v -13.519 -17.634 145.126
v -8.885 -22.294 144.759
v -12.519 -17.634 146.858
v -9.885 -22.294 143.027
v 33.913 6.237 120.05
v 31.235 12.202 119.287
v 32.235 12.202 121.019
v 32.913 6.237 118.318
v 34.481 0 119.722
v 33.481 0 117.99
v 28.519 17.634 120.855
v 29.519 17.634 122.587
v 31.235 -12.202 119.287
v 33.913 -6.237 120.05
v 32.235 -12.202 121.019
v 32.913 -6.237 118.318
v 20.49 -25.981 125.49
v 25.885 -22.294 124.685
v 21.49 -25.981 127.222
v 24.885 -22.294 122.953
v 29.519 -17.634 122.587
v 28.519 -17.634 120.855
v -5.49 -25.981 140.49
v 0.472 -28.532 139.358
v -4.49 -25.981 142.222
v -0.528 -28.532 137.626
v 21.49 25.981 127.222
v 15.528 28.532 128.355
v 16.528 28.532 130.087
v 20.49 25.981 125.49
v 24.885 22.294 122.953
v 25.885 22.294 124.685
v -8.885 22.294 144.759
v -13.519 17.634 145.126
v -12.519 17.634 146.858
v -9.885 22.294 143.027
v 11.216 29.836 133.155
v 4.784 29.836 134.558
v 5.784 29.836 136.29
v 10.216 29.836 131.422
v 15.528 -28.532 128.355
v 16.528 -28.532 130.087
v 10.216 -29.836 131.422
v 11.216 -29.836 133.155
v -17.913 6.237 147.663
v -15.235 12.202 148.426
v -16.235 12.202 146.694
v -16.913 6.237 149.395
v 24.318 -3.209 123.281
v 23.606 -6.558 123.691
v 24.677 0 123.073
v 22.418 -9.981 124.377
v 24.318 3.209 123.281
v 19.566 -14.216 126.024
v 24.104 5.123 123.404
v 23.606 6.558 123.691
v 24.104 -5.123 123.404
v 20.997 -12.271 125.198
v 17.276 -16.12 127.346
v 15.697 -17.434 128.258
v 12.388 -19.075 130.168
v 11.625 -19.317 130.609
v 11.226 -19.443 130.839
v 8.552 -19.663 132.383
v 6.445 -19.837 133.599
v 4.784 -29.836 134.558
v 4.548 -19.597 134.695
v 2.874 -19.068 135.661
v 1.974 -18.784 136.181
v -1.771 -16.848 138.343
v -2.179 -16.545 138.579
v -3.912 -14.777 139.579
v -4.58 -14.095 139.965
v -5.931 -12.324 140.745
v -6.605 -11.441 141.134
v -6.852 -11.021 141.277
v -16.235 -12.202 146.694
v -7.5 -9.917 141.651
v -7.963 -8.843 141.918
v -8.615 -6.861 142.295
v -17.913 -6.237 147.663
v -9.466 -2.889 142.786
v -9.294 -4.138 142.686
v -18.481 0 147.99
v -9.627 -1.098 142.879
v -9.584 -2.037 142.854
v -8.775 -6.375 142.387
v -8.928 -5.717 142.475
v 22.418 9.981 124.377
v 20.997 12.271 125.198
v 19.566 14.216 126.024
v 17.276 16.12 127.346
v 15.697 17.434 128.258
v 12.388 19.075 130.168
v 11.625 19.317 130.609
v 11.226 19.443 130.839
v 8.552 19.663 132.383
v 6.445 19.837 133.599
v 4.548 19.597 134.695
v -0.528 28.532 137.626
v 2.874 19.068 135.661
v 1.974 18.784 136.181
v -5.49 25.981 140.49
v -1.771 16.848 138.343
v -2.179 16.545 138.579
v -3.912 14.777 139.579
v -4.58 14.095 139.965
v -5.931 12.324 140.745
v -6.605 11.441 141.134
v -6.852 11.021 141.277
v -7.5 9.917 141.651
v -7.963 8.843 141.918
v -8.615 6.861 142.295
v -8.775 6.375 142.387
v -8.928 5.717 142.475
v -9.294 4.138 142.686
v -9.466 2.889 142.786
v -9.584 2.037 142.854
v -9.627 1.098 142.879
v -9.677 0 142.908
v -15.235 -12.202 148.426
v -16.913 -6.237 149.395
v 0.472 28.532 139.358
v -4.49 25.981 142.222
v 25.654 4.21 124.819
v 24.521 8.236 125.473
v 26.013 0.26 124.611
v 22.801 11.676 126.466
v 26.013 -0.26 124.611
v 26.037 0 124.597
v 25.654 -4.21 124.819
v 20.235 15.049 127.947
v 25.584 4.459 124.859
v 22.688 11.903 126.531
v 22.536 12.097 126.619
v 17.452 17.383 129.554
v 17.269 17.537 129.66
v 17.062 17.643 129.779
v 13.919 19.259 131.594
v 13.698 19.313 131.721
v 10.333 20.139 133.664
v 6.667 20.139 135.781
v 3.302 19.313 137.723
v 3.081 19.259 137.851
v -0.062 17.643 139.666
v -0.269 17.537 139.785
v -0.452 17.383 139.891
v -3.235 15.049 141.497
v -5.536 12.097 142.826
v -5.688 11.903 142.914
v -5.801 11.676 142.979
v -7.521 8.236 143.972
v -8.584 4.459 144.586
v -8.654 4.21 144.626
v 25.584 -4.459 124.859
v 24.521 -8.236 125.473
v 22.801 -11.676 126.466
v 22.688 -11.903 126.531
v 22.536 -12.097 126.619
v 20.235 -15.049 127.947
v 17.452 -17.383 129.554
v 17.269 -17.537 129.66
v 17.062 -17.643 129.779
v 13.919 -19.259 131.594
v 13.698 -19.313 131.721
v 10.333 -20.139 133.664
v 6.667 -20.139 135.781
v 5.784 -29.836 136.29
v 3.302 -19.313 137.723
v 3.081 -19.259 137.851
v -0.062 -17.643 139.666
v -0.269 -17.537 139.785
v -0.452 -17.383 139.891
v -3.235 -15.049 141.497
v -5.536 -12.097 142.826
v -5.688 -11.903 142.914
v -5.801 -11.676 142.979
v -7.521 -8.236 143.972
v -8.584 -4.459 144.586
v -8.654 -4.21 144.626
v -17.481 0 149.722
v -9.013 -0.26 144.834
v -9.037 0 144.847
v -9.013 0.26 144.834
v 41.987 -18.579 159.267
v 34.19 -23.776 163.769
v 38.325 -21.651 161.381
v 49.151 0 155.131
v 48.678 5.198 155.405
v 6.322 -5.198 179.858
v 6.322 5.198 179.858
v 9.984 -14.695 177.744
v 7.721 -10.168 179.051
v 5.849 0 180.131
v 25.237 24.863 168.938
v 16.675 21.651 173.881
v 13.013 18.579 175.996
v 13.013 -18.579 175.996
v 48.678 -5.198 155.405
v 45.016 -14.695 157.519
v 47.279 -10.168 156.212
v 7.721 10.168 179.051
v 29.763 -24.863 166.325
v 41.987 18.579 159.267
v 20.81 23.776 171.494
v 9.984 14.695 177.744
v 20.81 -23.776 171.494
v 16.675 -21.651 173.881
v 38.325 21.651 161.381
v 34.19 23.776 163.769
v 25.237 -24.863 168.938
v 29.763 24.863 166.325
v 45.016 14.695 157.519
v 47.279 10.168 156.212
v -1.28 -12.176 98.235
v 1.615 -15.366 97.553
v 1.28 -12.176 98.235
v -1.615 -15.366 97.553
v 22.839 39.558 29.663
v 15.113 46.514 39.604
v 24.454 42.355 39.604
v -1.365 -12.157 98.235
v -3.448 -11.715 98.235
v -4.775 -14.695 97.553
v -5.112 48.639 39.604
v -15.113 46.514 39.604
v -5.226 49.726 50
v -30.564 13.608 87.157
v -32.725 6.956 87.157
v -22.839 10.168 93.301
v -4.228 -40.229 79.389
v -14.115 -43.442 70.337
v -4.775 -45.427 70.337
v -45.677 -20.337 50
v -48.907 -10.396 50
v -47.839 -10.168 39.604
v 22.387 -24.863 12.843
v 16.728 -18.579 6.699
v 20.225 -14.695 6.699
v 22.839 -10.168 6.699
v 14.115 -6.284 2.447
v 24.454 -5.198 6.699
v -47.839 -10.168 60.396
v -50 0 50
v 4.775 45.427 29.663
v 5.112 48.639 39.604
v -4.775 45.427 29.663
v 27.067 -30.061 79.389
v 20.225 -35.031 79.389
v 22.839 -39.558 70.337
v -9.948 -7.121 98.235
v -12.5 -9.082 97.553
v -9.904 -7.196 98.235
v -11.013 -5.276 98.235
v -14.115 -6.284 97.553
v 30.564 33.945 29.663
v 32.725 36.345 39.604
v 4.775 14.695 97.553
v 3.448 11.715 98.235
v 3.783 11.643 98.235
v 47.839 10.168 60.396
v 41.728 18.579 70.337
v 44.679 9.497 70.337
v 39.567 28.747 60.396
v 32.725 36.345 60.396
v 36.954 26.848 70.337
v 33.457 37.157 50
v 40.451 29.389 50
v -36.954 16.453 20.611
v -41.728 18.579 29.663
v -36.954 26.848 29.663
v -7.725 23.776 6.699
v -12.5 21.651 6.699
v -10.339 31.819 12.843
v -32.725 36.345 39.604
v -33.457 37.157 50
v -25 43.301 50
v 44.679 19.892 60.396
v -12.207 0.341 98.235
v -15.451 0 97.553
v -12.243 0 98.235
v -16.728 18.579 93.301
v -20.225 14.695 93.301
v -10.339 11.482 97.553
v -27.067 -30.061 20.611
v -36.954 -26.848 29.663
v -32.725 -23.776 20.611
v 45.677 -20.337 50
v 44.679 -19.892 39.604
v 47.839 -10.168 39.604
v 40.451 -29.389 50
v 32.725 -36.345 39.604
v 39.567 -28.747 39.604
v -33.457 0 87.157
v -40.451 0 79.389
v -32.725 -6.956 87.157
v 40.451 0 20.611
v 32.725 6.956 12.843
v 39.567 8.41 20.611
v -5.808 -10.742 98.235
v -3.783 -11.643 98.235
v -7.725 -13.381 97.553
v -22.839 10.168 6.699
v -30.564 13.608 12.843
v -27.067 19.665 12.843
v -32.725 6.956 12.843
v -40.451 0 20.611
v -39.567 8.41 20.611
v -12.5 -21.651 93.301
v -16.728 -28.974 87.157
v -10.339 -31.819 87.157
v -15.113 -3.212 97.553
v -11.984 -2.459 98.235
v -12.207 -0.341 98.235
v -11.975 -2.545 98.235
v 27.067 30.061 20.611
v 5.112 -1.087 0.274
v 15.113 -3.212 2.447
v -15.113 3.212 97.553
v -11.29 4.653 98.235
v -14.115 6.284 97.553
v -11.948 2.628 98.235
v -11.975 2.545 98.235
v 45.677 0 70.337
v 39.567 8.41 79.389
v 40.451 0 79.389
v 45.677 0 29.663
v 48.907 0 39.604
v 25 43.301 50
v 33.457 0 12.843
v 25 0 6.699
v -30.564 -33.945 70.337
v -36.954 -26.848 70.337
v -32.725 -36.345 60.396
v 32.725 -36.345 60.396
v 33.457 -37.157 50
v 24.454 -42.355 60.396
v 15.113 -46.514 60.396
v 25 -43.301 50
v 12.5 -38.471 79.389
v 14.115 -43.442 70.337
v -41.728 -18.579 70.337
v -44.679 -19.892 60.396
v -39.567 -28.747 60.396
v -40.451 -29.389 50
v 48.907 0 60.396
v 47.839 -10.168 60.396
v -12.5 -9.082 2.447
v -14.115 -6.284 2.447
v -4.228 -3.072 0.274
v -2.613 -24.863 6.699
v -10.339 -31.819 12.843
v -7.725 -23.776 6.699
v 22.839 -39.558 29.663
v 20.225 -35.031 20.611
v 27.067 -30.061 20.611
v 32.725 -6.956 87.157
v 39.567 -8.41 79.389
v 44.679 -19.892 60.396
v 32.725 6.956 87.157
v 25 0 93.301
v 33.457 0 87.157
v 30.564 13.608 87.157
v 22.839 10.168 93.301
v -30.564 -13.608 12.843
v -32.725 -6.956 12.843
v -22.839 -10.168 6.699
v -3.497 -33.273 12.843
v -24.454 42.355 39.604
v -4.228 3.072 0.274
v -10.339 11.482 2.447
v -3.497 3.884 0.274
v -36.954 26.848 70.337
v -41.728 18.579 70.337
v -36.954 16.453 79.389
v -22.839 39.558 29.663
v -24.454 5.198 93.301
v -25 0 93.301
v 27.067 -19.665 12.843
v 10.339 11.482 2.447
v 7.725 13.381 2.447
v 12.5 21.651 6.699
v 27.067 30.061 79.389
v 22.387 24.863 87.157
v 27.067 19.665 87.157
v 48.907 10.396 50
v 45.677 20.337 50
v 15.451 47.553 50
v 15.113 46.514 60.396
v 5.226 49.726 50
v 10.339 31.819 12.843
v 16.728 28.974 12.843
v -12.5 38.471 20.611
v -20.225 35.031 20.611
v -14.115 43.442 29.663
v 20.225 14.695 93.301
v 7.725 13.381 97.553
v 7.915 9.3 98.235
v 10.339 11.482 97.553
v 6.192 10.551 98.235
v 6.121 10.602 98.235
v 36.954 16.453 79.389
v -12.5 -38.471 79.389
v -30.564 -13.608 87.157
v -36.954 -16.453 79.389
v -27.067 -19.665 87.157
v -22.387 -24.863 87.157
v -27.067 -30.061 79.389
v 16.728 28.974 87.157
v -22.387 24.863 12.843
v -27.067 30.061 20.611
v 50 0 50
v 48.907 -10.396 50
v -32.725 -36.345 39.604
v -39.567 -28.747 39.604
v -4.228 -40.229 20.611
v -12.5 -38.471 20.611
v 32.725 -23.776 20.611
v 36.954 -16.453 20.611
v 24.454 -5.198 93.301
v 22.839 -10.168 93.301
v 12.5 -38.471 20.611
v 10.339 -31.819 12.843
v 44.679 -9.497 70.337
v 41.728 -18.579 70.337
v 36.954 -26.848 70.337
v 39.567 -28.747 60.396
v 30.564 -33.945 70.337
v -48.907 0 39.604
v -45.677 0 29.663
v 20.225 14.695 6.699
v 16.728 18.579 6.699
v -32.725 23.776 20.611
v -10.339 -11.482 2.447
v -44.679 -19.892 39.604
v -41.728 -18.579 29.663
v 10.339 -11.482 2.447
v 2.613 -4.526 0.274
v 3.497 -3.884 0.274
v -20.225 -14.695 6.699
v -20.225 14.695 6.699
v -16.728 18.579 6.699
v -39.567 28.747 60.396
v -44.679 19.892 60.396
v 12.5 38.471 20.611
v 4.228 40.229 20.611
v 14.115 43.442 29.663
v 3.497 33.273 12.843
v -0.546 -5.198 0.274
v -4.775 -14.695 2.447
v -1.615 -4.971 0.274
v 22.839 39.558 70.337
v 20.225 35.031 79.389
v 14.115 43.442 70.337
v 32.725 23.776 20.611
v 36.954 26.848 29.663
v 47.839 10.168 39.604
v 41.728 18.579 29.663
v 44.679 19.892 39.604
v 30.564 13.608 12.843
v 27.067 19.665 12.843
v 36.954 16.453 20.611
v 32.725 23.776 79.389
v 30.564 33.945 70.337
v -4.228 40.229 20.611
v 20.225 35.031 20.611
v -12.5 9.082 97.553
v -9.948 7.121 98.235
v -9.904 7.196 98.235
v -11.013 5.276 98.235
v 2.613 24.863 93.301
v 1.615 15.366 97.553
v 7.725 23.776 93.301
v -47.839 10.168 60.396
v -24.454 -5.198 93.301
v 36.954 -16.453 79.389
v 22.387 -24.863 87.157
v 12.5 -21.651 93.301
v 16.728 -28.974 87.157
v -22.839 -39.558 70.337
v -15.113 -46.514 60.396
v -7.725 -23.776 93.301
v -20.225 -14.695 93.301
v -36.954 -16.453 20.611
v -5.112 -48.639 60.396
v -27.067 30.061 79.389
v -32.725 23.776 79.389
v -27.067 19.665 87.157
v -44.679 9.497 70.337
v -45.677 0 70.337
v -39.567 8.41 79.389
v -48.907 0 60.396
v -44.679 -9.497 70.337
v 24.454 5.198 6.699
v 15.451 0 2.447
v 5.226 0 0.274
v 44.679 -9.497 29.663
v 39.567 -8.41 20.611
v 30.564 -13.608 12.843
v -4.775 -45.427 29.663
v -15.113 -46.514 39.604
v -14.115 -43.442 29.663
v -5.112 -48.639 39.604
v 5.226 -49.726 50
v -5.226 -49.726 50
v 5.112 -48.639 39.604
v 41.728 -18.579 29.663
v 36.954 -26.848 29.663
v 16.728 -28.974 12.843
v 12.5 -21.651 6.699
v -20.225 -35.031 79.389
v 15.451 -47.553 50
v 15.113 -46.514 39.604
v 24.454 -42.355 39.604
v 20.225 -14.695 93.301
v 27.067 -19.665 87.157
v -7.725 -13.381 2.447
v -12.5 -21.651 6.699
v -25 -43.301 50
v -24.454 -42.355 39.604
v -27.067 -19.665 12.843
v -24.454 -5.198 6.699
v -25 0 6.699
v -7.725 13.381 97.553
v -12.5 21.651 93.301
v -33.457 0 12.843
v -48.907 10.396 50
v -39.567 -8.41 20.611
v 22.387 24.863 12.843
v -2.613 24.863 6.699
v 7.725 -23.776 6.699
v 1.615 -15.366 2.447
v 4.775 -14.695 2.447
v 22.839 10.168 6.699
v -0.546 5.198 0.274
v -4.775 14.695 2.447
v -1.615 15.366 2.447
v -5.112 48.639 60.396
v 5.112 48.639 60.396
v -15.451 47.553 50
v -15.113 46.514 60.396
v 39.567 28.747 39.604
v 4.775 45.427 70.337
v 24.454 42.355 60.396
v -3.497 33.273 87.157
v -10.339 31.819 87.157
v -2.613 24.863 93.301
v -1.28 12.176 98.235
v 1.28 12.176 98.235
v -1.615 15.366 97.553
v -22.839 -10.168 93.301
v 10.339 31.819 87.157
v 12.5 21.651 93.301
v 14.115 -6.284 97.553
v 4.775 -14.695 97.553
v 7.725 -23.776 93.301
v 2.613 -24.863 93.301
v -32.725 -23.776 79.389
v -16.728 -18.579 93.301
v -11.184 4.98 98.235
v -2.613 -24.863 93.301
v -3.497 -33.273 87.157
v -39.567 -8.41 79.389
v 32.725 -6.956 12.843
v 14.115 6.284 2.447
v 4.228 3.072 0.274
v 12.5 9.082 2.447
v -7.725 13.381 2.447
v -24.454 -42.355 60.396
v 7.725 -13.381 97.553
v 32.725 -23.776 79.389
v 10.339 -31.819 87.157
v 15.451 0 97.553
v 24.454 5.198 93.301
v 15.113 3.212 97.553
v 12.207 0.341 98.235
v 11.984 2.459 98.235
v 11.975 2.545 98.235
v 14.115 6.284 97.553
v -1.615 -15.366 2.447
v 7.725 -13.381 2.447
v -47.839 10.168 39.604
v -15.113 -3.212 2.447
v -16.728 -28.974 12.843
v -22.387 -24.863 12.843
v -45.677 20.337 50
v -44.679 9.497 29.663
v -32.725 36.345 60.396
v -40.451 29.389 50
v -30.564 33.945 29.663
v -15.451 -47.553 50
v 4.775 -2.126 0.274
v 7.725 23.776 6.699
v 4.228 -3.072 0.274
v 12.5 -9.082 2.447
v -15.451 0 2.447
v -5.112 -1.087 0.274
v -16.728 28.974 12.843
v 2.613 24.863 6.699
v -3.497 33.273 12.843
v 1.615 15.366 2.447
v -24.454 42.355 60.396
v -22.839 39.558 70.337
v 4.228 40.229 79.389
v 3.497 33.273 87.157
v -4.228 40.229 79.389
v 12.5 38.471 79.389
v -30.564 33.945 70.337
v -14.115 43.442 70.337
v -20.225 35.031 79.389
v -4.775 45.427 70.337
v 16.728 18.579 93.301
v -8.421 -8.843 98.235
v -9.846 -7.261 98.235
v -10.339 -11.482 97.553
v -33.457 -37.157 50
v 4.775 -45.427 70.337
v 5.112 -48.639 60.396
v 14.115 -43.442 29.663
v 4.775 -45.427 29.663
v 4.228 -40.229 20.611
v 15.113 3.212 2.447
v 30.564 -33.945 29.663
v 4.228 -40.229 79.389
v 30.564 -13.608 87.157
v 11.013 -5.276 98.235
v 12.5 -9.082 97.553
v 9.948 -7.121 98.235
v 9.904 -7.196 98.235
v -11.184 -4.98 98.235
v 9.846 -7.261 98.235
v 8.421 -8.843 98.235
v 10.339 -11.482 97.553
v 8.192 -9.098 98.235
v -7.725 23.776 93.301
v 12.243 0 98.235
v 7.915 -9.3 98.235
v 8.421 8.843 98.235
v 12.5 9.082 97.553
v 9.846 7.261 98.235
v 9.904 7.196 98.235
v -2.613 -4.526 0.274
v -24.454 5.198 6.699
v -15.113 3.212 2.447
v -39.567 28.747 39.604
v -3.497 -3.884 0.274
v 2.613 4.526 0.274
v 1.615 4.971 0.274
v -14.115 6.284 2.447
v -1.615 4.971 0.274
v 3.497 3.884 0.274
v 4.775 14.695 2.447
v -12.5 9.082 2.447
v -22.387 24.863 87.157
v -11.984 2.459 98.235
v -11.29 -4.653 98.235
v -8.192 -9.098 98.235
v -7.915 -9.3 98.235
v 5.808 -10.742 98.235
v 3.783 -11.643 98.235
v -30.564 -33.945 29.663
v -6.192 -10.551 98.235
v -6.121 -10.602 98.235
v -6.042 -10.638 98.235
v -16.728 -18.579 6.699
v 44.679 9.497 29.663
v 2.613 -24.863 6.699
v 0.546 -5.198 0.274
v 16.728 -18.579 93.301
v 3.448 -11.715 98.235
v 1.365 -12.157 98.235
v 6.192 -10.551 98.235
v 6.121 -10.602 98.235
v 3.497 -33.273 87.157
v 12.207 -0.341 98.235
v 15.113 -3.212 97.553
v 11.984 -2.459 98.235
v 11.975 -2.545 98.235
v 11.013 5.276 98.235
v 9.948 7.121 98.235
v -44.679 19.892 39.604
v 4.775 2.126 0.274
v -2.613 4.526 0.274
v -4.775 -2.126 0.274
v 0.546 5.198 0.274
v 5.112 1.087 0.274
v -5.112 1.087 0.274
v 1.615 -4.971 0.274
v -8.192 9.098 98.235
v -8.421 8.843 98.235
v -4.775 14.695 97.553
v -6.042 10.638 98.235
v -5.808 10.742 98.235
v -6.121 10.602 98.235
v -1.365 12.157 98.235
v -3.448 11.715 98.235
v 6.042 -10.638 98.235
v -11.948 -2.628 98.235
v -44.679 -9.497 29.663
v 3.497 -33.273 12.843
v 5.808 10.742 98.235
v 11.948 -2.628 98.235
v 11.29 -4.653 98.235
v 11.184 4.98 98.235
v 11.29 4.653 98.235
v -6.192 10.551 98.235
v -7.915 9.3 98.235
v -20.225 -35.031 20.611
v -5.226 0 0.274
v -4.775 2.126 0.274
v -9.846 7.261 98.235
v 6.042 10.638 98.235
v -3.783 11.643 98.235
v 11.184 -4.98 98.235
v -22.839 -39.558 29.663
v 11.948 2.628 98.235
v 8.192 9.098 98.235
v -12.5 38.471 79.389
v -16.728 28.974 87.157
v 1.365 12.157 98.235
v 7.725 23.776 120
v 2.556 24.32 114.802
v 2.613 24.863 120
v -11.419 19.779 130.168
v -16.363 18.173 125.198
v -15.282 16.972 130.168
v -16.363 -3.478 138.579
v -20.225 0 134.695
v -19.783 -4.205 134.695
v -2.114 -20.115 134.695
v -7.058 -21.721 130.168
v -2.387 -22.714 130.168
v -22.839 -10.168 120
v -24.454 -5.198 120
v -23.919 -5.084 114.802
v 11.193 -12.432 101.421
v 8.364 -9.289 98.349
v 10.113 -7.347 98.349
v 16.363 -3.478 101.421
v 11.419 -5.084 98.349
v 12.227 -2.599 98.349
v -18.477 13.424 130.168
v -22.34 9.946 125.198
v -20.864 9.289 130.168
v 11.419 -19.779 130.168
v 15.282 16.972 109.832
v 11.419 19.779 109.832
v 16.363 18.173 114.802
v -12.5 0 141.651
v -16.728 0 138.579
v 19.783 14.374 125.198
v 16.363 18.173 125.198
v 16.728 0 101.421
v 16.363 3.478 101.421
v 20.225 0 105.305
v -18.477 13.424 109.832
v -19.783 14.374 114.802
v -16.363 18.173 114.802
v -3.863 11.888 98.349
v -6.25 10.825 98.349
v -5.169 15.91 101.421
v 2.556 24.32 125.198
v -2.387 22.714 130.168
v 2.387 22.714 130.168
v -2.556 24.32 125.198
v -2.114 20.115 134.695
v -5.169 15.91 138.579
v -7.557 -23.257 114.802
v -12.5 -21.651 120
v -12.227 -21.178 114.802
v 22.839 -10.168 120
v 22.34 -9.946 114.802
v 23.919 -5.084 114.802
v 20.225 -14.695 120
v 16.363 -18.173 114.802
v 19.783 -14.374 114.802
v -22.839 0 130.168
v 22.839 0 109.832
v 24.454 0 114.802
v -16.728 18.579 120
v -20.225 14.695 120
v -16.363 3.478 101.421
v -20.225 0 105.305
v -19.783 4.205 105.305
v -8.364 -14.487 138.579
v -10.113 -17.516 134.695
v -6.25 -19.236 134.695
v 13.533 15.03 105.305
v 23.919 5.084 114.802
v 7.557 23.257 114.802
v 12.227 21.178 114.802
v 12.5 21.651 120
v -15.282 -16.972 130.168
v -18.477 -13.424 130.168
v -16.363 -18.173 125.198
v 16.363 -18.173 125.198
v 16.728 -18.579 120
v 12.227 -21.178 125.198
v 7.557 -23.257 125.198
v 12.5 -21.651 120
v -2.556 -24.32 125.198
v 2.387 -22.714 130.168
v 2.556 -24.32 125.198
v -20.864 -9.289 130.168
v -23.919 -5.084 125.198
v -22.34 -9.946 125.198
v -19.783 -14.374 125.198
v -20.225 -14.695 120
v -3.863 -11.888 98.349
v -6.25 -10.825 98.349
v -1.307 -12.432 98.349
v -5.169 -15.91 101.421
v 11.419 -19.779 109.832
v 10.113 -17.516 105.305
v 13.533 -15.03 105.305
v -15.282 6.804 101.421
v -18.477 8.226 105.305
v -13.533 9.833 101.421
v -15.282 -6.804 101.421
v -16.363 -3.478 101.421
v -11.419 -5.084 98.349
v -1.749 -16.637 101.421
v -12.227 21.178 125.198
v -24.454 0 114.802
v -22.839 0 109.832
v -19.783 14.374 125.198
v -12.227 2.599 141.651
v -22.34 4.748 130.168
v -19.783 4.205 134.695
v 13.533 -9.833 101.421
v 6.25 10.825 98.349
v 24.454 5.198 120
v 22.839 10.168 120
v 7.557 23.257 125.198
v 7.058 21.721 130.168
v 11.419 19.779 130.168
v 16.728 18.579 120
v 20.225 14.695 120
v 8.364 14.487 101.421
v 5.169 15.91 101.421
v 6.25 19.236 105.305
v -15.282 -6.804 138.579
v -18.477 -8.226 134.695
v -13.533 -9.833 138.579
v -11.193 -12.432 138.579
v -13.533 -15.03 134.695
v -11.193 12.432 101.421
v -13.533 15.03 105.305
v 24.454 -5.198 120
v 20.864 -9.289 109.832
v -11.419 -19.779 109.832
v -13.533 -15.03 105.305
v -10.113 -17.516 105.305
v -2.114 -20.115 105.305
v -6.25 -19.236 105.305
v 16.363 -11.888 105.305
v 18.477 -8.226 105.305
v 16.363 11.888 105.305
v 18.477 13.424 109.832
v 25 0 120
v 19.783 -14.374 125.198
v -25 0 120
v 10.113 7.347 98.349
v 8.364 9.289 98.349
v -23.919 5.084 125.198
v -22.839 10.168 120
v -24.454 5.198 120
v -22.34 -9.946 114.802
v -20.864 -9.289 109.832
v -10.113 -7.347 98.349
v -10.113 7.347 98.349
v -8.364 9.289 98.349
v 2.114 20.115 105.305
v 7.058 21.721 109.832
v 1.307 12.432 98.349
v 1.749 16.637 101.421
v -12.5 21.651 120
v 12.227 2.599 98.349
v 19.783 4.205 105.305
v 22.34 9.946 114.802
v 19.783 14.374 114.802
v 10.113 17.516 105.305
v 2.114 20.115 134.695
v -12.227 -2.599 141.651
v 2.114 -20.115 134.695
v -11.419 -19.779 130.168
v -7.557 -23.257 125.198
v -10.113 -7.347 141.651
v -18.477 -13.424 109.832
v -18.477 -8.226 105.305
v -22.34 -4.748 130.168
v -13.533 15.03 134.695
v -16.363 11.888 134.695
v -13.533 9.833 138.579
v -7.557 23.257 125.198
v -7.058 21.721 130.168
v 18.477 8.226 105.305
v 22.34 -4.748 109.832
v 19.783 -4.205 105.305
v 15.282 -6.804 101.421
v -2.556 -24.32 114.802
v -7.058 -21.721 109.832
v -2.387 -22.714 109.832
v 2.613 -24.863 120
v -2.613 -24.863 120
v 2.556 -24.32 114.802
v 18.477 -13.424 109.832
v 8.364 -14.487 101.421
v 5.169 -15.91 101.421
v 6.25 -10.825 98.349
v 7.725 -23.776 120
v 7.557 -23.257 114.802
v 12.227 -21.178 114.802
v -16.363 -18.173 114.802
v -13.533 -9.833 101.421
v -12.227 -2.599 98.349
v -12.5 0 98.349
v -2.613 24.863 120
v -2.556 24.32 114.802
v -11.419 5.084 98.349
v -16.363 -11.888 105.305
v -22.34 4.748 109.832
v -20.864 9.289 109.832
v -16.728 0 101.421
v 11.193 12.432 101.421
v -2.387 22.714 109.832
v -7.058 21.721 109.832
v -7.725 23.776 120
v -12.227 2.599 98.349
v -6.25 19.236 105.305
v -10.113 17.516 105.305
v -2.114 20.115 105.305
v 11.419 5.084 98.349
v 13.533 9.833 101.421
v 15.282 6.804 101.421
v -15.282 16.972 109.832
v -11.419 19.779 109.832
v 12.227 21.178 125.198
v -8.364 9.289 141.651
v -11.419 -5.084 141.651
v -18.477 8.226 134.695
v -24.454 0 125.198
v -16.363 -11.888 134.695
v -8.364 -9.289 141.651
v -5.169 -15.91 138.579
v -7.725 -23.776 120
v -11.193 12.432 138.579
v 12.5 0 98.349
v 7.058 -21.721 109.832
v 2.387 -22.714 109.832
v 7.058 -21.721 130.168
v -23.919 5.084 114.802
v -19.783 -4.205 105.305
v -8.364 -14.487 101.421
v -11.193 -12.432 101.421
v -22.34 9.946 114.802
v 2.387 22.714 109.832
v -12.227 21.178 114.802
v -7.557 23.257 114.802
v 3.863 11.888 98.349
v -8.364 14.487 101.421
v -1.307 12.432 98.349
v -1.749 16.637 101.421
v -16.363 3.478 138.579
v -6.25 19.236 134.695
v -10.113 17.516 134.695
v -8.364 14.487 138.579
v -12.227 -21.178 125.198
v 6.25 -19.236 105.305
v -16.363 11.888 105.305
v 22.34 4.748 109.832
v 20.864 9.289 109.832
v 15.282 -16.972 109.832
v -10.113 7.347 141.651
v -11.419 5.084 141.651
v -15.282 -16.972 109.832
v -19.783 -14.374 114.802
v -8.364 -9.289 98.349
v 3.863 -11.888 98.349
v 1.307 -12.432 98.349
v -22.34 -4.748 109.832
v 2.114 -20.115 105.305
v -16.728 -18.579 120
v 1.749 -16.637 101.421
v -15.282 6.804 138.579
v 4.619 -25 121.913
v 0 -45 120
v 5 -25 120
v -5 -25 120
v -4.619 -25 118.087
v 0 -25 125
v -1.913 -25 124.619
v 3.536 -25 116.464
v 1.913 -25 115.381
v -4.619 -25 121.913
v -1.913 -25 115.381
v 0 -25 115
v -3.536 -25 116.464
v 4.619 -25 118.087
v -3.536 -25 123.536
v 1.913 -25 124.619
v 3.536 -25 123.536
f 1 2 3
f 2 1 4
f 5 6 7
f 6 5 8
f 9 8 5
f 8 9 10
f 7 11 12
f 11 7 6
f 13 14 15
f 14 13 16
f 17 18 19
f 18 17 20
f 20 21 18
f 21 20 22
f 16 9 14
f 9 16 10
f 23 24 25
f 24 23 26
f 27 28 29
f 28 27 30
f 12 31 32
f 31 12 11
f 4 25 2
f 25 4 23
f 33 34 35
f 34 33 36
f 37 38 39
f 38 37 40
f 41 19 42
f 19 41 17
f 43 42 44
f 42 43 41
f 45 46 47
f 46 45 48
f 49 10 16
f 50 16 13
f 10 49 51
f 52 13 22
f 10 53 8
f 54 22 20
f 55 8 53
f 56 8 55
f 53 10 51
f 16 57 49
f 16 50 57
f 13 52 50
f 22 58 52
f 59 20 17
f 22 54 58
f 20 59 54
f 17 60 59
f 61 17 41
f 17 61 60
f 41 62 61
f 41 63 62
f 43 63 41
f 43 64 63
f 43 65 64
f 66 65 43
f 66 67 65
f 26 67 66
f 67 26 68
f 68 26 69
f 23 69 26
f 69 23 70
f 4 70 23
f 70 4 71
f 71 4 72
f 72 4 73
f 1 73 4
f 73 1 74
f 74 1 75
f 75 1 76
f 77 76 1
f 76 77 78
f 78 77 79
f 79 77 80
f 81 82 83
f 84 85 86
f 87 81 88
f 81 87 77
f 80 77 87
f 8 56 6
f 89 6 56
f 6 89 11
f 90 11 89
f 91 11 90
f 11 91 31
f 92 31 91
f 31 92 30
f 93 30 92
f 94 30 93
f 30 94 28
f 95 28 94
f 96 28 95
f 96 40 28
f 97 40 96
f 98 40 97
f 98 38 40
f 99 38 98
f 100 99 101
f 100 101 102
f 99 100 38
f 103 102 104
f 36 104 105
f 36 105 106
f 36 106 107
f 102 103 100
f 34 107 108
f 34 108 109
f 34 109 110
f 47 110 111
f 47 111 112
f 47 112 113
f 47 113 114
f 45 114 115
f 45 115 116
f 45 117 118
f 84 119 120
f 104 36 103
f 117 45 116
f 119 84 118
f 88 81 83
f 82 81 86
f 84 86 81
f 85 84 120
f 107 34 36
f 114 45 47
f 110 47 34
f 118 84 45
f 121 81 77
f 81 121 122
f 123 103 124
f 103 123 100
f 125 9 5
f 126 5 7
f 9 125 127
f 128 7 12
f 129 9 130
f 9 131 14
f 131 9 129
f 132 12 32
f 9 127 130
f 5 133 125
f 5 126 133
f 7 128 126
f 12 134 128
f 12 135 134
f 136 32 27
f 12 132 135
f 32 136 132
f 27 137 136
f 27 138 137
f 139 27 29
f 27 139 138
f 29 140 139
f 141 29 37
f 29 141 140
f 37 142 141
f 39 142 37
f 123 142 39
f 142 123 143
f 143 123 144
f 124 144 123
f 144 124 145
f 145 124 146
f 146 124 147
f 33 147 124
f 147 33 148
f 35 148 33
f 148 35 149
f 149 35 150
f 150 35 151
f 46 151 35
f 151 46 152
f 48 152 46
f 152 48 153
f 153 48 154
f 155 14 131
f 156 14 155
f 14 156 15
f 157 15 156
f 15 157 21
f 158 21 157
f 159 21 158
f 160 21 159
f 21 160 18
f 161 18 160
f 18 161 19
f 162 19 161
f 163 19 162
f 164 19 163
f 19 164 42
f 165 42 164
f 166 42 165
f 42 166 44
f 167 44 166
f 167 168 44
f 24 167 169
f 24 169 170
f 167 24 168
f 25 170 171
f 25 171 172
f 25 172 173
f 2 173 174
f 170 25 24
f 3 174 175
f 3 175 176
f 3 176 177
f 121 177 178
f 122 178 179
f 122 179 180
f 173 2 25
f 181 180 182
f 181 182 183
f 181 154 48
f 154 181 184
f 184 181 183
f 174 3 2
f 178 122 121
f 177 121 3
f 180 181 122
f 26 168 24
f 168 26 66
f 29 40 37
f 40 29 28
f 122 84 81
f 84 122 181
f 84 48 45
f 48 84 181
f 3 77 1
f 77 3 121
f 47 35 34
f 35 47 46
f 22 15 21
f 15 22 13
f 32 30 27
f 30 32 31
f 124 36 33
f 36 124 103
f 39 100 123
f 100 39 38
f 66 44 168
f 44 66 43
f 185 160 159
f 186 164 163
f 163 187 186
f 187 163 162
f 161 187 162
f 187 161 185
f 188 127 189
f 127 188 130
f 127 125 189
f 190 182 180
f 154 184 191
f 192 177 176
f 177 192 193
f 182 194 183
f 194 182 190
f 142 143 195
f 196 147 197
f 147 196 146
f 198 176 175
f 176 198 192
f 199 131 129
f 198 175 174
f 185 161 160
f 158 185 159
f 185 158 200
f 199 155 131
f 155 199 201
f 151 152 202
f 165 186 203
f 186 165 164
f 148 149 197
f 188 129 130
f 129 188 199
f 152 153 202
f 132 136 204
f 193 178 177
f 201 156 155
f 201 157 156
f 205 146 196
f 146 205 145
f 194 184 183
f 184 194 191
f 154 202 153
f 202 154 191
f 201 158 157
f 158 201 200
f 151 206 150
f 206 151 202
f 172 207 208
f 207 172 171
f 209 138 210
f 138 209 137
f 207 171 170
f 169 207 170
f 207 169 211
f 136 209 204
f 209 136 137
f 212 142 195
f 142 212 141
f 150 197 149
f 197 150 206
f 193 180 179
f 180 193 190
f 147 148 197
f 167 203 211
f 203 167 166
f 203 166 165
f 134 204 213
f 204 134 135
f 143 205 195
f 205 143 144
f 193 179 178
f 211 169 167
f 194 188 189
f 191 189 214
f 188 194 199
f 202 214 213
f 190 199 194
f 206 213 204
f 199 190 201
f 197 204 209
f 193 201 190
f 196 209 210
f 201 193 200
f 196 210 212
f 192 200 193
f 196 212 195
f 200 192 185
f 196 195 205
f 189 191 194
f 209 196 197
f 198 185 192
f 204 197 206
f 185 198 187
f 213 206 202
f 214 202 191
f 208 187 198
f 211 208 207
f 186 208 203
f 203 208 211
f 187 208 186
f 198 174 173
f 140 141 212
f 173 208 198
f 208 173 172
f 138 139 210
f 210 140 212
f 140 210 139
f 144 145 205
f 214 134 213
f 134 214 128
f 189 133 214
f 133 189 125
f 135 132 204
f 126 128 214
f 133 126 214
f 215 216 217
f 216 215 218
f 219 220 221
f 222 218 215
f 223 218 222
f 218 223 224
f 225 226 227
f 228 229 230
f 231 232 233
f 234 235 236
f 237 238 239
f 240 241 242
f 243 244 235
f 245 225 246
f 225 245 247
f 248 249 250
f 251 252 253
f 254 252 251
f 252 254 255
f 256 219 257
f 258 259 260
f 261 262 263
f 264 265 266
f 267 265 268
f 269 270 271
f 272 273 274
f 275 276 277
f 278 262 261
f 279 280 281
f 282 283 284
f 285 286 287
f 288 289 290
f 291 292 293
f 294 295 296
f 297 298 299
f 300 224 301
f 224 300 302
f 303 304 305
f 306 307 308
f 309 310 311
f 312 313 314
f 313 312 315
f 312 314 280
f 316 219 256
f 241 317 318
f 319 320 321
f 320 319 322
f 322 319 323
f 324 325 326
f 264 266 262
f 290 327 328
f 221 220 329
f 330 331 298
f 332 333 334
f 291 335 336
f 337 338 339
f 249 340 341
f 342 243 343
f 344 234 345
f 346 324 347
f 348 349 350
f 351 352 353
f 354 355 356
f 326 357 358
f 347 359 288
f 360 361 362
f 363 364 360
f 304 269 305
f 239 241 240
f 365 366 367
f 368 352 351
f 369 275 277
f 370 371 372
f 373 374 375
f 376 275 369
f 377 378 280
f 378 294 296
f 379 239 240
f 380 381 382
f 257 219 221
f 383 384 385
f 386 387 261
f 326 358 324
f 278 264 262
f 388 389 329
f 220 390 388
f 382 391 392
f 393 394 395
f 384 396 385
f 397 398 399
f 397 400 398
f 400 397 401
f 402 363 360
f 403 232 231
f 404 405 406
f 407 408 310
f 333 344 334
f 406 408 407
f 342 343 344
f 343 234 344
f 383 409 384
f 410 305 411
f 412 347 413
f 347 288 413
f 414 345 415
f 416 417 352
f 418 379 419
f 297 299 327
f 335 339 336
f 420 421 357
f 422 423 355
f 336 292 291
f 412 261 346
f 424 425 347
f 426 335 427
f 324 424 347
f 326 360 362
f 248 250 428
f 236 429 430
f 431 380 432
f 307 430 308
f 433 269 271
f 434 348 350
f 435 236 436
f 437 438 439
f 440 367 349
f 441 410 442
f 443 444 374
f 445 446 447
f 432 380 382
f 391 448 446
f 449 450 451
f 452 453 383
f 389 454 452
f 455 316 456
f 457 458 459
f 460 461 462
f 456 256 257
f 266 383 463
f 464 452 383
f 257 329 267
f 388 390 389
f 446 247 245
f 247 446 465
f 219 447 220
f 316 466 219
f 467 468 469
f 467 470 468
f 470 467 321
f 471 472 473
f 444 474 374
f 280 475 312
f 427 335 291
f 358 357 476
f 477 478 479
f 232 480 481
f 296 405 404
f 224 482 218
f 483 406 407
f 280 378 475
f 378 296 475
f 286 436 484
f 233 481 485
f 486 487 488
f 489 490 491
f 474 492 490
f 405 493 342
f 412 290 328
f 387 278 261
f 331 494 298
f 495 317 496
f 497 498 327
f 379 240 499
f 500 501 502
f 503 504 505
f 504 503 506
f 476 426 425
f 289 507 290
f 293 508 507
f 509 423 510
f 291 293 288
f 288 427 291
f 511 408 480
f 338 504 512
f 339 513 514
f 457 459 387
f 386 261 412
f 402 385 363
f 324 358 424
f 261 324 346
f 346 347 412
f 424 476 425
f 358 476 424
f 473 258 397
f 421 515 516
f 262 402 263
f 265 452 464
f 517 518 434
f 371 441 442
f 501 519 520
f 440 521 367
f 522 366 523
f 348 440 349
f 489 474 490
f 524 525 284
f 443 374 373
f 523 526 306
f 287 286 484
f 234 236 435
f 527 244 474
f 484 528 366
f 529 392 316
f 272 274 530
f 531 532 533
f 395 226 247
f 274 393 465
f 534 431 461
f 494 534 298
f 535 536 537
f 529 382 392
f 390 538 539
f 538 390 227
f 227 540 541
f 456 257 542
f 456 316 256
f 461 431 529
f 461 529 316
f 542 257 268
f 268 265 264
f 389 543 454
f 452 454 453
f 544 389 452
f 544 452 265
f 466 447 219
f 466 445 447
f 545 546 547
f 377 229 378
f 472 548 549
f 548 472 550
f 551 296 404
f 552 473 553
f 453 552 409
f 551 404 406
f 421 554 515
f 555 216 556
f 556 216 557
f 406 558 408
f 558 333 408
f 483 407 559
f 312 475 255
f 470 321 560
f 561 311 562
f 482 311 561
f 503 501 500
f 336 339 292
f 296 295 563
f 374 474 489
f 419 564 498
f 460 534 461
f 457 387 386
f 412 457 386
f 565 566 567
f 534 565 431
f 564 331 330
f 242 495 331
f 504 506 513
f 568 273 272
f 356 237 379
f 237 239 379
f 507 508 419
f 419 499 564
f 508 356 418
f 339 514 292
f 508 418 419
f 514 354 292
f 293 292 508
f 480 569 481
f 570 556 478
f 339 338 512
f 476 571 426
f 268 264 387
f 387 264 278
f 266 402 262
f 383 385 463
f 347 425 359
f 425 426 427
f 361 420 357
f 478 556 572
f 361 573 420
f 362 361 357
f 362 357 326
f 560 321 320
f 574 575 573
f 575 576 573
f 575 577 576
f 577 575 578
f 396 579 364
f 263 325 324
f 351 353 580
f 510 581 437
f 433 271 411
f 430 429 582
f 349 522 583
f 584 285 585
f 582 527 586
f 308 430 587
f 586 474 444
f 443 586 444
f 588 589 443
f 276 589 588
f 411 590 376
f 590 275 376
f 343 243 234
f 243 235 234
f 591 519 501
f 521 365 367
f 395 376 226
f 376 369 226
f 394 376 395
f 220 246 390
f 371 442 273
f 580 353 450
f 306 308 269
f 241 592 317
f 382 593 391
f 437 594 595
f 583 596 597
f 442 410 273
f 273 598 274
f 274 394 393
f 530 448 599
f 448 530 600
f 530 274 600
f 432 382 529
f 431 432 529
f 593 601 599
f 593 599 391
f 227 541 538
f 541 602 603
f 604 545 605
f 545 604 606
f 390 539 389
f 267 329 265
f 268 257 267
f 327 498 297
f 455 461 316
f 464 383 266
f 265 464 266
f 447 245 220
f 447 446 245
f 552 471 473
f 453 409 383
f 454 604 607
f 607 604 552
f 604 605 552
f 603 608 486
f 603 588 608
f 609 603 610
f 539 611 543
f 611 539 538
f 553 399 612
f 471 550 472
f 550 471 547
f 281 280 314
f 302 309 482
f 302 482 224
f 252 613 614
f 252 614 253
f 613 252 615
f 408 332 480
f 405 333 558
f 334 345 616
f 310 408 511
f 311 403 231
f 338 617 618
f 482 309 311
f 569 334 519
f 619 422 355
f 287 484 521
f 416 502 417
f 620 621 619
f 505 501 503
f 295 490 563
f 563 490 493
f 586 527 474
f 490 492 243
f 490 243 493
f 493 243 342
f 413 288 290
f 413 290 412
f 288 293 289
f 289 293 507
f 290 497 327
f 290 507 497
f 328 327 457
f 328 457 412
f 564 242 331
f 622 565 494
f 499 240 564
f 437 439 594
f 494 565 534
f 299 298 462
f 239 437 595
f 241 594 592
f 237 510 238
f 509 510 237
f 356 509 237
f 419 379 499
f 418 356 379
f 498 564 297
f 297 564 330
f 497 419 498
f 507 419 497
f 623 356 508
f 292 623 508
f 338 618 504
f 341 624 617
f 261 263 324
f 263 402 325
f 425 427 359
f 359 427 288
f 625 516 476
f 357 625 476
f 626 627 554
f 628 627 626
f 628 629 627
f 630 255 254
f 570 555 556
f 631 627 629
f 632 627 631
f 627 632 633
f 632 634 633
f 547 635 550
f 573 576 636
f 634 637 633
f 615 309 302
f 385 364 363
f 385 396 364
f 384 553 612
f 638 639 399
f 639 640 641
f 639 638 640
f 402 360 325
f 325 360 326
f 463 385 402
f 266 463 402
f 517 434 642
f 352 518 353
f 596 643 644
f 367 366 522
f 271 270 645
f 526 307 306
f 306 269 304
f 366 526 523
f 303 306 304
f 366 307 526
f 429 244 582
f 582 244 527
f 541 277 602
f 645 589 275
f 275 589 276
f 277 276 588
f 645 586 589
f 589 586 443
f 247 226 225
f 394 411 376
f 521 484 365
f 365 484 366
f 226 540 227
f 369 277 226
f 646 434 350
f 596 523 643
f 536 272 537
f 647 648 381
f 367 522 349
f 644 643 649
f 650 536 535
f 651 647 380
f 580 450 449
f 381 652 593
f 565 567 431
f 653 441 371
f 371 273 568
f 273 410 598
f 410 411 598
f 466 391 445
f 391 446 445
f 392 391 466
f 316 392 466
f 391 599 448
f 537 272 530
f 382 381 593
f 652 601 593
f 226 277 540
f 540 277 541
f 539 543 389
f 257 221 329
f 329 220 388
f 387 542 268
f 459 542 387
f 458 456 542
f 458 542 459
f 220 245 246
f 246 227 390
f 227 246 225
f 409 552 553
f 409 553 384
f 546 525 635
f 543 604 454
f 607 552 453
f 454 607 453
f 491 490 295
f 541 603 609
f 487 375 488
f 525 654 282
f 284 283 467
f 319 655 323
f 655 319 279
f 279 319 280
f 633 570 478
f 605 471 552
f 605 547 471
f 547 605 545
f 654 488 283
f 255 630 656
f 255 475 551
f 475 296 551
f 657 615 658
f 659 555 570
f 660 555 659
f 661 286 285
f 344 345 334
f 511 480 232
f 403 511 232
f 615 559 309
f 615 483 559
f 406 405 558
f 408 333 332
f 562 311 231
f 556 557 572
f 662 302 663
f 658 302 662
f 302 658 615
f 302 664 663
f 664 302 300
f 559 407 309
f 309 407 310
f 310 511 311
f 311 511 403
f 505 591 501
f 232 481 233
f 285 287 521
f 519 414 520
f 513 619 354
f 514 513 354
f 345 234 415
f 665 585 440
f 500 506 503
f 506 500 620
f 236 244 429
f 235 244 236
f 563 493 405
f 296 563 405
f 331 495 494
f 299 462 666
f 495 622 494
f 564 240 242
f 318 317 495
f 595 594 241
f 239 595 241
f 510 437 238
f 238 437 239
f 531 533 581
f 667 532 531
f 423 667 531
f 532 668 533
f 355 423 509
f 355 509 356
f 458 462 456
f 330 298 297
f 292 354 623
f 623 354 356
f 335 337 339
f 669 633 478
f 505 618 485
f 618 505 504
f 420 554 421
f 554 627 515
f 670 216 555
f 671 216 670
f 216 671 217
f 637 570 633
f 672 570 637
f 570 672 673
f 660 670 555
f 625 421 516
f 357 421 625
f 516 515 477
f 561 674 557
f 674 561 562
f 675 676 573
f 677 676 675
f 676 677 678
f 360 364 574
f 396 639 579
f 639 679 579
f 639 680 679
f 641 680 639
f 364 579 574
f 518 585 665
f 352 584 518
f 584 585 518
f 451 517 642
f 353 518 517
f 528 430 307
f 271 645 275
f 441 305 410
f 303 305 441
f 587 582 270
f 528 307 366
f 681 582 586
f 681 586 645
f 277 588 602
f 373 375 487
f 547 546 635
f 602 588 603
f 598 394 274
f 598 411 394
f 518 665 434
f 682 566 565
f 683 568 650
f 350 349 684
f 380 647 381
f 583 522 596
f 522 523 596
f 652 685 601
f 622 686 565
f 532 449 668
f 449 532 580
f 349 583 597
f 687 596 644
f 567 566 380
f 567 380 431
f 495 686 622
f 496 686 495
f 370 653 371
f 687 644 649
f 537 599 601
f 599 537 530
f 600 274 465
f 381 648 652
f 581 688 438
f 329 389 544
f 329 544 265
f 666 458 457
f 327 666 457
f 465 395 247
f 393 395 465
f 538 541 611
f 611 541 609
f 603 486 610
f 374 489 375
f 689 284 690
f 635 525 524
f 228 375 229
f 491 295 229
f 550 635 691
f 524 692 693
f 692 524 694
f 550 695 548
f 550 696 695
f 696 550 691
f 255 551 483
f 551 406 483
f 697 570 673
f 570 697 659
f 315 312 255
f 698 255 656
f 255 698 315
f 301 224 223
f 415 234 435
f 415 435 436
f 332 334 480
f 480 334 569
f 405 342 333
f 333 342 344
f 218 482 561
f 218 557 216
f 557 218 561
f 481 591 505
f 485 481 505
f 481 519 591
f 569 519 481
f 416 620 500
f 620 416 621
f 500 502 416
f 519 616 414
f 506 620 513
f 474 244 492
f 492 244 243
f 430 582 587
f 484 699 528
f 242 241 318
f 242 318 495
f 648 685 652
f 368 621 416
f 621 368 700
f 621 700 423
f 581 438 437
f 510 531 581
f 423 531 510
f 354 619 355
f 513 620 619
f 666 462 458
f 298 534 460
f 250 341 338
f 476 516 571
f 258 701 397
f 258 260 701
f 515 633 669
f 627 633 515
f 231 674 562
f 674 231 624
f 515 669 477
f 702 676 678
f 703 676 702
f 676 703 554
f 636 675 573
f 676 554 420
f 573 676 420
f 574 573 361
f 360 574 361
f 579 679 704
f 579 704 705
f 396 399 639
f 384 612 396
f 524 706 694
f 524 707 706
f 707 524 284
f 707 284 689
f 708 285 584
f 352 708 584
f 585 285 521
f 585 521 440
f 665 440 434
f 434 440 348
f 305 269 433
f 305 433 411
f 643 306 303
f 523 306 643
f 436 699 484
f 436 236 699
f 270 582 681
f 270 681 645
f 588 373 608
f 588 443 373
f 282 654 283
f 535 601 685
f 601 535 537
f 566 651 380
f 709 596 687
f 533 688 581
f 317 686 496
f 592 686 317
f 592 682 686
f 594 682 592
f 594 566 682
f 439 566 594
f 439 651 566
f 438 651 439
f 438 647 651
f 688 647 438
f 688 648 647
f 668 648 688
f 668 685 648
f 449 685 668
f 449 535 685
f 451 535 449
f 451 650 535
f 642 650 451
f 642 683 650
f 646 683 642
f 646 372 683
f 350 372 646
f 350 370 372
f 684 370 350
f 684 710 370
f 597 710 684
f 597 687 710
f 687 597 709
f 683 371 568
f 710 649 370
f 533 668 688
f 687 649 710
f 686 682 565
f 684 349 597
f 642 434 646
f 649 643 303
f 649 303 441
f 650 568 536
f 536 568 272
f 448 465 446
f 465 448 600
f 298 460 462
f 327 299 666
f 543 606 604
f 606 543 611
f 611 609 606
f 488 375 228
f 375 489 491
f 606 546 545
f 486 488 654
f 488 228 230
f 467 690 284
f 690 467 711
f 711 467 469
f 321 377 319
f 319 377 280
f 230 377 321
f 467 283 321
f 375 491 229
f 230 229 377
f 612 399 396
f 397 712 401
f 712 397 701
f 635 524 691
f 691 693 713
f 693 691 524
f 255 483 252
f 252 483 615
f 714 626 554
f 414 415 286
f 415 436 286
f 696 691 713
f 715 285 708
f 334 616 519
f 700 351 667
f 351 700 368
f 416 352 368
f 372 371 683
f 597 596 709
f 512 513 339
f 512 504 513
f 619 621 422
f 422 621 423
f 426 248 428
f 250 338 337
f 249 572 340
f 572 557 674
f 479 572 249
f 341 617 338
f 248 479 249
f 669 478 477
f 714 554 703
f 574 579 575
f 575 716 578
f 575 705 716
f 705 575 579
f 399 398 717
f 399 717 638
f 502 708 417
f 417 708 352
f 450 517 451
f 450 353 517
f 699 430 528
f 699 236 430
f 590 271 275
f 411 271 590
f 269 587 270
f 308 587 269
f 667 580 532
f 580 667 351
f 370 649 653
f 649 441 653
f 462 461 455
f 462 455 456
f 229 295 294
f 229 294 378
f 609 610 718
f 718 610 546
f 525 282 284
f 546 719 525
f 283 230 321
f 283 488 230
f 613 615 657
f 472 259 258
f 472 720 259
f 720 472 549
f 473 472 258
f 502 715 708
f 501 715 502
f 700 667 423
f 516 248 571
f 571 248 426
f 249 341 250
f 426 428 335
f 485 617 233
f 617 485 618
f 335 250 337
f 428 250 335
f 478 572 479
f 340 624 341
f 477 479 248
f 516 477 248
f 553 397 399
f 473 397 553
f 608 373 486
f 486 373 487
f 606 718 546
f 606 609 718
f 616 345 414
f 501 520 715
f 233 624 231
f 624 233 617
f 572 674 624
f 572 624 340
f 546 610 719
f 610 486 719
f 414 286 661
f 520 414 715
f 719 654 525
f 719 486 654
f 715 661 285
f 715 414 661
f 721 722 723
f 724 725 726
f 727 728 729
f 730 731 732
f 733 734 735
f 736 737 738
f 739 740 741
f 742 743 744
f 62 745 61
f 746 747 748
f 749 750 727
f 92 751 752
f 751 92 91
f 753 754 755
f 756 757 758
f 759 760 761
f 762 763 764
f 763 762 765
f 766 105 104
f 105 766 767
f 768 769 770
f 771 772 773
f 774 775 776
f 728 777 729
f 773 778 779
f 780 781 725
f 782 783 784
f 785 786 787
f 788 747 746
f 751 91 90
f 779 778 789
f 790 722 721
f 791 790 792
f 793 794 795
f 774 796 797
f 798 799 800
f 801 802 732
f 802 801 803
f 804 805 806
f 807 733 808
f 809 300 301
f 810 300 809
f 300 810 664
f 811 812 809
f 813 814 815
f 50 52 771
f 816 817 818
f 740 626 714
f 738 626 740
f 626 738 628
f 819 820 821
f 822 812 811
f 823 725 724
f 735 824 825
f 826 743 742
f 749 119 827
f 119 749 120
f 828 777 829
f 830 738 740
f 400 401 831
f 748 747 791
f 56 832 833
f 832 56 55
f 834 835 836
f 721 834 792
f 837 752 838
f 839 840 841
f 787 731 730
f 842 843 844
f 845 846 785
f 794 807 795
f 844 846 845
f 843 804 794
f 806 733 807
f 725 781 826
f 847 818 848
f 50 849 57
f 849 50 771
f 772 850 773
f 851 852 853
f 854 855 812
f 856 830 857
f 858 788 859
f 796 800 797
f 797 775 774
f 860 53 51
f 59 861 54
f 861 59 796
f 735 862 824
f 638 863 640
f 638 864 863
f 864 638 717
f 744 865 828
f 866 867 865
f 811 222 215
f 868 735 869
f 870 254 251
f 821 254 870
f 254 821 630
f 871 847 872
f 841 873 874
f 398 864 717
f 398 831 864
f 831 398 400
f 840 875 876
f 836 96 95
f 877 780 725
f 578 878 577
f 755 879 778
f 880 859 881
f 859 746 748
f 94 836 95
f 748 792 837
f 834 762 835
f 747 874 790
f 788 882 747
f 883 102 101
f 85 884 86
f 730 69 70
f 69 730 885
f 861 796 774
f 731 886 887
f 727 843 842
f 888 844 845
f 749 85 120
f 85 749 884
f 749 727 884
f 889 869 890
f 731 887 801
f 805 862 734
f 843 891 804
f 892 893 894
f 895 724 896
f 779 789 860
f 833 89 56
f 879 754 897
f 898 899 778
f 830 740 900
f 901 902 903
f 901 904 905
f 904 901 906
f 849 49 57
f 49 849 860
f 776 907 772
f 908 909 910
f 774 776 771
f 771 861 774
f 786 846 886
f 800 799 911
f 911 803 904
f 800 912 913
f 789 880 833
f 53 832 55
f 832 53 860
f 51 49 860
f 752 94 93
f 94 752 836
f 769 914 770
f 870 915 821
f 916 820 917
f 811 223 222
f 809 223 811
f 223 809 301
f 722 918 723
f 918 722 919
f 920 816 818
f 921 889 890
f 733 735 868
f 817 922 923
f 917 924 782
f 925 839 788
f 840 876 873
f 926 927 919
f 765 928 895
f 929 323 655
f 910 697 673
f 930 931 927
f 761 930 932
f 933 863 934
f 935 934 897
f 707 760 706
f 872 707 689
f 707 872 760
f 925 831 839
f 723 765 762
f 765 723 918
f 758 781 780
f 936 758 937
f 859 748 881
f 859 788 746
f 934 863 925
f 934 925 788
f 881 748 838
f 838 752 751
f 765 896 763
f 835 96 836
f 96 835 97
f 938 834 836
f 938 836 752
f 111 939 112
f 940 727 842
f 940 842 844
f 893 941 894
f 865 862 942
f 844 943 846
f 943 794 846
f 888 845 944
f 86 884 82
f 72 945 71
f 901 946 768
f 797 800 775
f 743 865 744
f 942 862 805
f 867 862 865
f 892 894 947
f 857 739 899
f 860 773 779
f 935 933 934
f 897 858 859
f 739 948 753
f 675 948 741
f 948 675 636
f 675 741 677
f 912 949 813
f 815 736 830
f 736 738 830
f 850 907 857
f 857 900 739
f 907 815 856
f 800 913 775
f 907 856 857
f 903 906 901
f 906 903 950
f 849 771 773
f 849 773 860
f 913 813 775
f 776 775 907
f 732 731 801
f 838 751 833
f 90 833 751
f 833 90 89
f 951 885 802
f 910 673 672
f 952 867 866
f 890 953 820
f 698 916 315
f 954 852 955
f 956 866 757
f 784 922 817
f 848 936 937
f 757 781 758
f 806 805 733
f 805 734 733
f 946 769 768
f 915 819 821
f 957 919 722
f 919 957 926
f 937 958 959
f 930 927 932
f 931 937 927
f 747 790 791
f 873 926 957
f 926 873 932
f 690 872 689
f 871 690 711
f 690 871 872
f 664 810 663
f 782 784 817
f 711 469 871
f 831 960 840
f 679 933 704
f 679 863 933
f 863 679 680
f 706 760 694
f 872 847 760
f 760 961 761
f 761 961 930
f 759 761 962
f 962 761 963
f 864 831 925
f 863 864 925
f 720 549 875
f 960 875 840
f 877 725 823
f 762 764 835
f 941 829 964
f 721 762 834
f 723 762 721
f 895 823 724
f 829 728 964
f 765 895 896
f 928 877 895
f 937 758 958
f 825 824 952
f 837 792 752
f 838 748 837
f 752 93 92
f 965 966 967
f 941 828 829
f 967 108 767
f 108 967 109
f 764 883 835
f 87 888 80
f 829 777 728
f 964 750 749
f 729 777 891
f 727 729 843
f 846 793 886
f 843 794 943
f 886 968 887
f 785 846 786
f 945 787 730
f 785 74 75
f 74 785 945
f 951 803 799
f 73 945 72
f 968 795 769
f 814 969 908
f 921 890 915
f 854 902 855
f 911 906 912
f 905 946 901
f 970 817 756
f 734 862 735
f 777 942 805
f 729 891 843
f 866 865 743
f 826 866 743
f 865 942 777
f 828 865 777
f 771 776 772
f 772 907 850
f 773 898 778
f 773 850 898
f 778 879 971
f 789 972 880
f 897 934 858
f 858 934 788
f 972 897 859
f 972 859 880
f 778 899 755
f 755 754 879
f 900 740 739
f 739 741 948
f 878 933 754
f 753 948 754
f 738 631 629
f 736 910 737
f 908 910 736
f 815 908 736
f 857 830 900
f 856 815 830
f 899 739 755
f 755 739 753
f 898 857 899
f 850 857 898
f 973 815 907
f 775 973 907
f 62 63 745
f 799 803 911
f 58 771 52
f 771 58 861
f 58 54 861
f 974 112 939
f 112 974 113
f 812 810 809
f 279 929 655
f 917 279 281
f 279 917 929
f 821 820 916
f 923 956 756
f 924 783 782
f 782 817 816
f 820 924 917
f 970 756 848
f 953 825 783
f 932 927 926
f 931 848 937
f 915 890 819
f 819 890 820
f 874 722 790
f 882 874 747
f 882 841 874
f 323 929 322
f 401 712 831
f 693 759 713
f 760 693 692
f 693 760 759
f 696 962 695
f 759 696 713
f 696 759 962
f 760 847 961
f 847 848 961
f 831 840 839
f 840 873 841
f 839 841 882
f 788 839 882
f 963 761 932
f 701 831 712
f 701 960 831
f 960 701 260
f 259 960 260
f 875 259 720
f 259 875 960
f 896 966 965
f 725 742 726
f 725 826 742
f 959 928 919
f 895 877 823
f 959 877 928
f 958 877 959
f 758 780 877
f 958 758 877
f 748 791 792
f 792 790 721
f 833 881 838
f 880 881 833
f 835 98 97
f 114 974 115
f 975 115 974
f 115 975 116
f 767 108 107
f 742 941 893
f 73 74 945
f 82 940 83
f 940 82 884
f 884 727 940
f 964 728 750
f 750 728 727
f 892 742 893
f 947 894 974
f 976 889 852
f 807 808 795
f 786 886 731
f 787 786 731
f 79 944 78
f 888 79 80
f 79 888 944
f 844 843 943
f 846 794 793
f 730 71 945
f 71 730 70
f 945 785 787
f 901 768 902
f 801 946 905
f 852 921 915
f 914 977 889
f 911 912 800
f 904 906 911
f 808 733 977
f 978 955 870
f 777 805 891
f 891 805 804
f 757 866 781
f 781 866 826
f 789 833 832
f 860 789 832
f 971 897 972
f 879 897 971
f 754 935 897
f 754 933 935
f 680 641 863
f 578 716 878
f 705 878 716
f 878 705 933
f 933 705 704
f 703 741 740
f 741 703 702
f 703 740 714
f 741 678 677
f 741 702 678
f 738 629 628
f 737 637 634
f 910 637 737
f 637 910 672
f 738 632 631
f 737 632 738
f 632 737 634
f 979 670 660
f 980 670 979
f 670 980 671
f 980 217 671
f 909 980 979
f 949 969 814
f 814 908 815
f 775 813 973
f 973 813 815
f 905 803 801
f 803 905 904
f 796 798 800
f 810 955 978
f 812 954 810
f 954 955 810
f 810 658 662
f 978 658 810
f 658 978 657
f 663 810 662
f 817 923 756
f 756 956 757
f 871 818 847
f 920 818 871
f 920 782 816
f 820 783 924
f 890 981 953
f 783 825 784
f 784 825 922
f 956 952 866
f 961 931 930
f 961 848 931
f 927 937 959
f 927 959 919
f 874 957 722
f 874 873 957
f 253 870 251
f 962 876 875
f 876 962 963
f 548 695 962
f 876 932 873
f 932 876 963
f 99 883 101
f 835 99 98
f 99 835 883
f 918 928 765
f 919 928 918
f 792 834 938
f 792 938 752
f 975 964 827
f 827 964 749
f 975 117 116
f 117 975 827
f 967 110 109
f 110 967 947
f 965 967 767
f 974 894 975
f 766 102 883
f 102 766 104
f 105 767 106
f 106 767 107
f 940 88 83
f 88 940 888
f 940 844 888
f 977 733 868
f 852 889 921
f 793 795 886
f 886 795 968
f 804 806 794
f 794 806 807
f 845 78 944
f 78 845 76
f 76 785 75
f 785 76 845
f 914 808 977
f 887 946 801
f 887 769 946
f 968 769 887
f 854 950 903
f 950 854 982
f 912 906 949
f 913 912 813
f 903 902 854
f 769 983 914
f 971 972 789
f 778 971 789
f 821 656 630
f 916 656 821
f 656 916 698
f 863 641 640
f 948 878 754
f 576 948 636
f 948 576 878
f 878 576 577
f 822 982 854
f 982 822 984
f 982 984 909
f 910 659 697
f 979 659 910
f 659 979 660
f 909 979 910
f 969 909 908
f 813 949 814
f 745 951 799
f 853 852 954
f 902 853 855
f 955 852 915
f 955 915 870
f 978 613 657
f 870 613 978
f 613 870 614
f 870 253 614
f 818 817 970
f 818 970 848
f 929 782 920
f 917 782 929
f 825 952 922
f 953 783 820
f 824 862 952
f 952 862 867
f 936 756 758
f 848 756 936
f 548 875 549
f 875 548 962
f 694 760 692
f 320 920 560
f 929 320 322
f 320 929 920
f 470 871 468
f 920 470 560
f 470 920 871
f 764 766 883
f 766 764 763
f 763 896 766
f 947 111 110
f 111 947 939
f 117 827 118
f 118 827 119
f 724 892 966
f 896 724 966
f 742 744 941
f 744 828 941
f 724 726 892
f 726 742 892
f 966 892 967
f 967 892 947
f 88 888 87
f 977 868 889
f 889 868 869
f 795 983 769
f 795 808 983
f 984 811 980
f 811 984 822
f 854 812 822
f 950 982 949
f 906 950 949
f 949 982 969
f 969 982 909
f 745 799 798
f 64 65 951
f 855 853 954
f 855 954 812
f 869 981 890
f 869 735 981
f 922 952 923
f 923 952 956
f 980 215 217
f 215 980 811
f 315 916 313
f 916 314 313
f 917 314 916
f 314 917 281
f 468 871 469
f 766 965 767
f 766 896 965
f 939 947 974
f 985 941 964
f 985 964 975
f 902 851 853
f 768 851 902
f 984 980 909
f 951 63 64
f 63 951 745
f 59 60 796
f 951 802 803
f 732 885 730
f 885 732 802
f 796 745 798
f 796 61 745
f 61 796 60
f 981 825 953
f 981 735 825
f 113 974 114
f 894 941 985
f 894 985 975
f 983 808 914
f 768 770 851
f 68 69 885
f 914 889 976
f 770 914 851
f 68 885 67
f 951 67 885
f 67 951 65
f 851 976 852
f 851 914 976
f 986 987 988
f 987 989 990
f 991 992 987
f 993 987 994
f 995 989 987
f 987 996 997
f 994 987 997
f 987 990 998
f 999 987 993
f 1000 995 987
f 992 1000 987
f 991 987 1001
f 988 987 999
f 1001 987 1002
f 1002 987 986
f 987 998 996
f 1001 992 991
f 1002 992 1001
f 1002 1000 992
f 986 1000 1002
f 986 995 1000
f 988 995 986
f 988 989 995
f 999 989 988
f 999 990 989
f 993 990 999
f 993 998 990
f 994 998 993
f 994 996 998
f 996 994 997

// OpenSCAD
module snowman(jauntiness = 0) {
    // the snowman's body
    translate([0, 0, 50]) sphere(r = 50);
    // the snowman's head
    translate([0, 0, 120]) sphere(r = 25);
    

    // the snowman's hat
    translate([0, 0, 120]) rotate([0, jauntiness, 0]) {
        translate([0, 0, 15]) {
          cylinder(r = 30, h =  2);
          cylinder(r1 = 20, r2 = 25, h =  40);
        }
    }
    // A carrot
    translate([0, -25, 120]) rotate([90, 0, 0]) cylinder(r1 = 5, r2 = 0, h = 20);
}

snowman(jauntiness = 30);
